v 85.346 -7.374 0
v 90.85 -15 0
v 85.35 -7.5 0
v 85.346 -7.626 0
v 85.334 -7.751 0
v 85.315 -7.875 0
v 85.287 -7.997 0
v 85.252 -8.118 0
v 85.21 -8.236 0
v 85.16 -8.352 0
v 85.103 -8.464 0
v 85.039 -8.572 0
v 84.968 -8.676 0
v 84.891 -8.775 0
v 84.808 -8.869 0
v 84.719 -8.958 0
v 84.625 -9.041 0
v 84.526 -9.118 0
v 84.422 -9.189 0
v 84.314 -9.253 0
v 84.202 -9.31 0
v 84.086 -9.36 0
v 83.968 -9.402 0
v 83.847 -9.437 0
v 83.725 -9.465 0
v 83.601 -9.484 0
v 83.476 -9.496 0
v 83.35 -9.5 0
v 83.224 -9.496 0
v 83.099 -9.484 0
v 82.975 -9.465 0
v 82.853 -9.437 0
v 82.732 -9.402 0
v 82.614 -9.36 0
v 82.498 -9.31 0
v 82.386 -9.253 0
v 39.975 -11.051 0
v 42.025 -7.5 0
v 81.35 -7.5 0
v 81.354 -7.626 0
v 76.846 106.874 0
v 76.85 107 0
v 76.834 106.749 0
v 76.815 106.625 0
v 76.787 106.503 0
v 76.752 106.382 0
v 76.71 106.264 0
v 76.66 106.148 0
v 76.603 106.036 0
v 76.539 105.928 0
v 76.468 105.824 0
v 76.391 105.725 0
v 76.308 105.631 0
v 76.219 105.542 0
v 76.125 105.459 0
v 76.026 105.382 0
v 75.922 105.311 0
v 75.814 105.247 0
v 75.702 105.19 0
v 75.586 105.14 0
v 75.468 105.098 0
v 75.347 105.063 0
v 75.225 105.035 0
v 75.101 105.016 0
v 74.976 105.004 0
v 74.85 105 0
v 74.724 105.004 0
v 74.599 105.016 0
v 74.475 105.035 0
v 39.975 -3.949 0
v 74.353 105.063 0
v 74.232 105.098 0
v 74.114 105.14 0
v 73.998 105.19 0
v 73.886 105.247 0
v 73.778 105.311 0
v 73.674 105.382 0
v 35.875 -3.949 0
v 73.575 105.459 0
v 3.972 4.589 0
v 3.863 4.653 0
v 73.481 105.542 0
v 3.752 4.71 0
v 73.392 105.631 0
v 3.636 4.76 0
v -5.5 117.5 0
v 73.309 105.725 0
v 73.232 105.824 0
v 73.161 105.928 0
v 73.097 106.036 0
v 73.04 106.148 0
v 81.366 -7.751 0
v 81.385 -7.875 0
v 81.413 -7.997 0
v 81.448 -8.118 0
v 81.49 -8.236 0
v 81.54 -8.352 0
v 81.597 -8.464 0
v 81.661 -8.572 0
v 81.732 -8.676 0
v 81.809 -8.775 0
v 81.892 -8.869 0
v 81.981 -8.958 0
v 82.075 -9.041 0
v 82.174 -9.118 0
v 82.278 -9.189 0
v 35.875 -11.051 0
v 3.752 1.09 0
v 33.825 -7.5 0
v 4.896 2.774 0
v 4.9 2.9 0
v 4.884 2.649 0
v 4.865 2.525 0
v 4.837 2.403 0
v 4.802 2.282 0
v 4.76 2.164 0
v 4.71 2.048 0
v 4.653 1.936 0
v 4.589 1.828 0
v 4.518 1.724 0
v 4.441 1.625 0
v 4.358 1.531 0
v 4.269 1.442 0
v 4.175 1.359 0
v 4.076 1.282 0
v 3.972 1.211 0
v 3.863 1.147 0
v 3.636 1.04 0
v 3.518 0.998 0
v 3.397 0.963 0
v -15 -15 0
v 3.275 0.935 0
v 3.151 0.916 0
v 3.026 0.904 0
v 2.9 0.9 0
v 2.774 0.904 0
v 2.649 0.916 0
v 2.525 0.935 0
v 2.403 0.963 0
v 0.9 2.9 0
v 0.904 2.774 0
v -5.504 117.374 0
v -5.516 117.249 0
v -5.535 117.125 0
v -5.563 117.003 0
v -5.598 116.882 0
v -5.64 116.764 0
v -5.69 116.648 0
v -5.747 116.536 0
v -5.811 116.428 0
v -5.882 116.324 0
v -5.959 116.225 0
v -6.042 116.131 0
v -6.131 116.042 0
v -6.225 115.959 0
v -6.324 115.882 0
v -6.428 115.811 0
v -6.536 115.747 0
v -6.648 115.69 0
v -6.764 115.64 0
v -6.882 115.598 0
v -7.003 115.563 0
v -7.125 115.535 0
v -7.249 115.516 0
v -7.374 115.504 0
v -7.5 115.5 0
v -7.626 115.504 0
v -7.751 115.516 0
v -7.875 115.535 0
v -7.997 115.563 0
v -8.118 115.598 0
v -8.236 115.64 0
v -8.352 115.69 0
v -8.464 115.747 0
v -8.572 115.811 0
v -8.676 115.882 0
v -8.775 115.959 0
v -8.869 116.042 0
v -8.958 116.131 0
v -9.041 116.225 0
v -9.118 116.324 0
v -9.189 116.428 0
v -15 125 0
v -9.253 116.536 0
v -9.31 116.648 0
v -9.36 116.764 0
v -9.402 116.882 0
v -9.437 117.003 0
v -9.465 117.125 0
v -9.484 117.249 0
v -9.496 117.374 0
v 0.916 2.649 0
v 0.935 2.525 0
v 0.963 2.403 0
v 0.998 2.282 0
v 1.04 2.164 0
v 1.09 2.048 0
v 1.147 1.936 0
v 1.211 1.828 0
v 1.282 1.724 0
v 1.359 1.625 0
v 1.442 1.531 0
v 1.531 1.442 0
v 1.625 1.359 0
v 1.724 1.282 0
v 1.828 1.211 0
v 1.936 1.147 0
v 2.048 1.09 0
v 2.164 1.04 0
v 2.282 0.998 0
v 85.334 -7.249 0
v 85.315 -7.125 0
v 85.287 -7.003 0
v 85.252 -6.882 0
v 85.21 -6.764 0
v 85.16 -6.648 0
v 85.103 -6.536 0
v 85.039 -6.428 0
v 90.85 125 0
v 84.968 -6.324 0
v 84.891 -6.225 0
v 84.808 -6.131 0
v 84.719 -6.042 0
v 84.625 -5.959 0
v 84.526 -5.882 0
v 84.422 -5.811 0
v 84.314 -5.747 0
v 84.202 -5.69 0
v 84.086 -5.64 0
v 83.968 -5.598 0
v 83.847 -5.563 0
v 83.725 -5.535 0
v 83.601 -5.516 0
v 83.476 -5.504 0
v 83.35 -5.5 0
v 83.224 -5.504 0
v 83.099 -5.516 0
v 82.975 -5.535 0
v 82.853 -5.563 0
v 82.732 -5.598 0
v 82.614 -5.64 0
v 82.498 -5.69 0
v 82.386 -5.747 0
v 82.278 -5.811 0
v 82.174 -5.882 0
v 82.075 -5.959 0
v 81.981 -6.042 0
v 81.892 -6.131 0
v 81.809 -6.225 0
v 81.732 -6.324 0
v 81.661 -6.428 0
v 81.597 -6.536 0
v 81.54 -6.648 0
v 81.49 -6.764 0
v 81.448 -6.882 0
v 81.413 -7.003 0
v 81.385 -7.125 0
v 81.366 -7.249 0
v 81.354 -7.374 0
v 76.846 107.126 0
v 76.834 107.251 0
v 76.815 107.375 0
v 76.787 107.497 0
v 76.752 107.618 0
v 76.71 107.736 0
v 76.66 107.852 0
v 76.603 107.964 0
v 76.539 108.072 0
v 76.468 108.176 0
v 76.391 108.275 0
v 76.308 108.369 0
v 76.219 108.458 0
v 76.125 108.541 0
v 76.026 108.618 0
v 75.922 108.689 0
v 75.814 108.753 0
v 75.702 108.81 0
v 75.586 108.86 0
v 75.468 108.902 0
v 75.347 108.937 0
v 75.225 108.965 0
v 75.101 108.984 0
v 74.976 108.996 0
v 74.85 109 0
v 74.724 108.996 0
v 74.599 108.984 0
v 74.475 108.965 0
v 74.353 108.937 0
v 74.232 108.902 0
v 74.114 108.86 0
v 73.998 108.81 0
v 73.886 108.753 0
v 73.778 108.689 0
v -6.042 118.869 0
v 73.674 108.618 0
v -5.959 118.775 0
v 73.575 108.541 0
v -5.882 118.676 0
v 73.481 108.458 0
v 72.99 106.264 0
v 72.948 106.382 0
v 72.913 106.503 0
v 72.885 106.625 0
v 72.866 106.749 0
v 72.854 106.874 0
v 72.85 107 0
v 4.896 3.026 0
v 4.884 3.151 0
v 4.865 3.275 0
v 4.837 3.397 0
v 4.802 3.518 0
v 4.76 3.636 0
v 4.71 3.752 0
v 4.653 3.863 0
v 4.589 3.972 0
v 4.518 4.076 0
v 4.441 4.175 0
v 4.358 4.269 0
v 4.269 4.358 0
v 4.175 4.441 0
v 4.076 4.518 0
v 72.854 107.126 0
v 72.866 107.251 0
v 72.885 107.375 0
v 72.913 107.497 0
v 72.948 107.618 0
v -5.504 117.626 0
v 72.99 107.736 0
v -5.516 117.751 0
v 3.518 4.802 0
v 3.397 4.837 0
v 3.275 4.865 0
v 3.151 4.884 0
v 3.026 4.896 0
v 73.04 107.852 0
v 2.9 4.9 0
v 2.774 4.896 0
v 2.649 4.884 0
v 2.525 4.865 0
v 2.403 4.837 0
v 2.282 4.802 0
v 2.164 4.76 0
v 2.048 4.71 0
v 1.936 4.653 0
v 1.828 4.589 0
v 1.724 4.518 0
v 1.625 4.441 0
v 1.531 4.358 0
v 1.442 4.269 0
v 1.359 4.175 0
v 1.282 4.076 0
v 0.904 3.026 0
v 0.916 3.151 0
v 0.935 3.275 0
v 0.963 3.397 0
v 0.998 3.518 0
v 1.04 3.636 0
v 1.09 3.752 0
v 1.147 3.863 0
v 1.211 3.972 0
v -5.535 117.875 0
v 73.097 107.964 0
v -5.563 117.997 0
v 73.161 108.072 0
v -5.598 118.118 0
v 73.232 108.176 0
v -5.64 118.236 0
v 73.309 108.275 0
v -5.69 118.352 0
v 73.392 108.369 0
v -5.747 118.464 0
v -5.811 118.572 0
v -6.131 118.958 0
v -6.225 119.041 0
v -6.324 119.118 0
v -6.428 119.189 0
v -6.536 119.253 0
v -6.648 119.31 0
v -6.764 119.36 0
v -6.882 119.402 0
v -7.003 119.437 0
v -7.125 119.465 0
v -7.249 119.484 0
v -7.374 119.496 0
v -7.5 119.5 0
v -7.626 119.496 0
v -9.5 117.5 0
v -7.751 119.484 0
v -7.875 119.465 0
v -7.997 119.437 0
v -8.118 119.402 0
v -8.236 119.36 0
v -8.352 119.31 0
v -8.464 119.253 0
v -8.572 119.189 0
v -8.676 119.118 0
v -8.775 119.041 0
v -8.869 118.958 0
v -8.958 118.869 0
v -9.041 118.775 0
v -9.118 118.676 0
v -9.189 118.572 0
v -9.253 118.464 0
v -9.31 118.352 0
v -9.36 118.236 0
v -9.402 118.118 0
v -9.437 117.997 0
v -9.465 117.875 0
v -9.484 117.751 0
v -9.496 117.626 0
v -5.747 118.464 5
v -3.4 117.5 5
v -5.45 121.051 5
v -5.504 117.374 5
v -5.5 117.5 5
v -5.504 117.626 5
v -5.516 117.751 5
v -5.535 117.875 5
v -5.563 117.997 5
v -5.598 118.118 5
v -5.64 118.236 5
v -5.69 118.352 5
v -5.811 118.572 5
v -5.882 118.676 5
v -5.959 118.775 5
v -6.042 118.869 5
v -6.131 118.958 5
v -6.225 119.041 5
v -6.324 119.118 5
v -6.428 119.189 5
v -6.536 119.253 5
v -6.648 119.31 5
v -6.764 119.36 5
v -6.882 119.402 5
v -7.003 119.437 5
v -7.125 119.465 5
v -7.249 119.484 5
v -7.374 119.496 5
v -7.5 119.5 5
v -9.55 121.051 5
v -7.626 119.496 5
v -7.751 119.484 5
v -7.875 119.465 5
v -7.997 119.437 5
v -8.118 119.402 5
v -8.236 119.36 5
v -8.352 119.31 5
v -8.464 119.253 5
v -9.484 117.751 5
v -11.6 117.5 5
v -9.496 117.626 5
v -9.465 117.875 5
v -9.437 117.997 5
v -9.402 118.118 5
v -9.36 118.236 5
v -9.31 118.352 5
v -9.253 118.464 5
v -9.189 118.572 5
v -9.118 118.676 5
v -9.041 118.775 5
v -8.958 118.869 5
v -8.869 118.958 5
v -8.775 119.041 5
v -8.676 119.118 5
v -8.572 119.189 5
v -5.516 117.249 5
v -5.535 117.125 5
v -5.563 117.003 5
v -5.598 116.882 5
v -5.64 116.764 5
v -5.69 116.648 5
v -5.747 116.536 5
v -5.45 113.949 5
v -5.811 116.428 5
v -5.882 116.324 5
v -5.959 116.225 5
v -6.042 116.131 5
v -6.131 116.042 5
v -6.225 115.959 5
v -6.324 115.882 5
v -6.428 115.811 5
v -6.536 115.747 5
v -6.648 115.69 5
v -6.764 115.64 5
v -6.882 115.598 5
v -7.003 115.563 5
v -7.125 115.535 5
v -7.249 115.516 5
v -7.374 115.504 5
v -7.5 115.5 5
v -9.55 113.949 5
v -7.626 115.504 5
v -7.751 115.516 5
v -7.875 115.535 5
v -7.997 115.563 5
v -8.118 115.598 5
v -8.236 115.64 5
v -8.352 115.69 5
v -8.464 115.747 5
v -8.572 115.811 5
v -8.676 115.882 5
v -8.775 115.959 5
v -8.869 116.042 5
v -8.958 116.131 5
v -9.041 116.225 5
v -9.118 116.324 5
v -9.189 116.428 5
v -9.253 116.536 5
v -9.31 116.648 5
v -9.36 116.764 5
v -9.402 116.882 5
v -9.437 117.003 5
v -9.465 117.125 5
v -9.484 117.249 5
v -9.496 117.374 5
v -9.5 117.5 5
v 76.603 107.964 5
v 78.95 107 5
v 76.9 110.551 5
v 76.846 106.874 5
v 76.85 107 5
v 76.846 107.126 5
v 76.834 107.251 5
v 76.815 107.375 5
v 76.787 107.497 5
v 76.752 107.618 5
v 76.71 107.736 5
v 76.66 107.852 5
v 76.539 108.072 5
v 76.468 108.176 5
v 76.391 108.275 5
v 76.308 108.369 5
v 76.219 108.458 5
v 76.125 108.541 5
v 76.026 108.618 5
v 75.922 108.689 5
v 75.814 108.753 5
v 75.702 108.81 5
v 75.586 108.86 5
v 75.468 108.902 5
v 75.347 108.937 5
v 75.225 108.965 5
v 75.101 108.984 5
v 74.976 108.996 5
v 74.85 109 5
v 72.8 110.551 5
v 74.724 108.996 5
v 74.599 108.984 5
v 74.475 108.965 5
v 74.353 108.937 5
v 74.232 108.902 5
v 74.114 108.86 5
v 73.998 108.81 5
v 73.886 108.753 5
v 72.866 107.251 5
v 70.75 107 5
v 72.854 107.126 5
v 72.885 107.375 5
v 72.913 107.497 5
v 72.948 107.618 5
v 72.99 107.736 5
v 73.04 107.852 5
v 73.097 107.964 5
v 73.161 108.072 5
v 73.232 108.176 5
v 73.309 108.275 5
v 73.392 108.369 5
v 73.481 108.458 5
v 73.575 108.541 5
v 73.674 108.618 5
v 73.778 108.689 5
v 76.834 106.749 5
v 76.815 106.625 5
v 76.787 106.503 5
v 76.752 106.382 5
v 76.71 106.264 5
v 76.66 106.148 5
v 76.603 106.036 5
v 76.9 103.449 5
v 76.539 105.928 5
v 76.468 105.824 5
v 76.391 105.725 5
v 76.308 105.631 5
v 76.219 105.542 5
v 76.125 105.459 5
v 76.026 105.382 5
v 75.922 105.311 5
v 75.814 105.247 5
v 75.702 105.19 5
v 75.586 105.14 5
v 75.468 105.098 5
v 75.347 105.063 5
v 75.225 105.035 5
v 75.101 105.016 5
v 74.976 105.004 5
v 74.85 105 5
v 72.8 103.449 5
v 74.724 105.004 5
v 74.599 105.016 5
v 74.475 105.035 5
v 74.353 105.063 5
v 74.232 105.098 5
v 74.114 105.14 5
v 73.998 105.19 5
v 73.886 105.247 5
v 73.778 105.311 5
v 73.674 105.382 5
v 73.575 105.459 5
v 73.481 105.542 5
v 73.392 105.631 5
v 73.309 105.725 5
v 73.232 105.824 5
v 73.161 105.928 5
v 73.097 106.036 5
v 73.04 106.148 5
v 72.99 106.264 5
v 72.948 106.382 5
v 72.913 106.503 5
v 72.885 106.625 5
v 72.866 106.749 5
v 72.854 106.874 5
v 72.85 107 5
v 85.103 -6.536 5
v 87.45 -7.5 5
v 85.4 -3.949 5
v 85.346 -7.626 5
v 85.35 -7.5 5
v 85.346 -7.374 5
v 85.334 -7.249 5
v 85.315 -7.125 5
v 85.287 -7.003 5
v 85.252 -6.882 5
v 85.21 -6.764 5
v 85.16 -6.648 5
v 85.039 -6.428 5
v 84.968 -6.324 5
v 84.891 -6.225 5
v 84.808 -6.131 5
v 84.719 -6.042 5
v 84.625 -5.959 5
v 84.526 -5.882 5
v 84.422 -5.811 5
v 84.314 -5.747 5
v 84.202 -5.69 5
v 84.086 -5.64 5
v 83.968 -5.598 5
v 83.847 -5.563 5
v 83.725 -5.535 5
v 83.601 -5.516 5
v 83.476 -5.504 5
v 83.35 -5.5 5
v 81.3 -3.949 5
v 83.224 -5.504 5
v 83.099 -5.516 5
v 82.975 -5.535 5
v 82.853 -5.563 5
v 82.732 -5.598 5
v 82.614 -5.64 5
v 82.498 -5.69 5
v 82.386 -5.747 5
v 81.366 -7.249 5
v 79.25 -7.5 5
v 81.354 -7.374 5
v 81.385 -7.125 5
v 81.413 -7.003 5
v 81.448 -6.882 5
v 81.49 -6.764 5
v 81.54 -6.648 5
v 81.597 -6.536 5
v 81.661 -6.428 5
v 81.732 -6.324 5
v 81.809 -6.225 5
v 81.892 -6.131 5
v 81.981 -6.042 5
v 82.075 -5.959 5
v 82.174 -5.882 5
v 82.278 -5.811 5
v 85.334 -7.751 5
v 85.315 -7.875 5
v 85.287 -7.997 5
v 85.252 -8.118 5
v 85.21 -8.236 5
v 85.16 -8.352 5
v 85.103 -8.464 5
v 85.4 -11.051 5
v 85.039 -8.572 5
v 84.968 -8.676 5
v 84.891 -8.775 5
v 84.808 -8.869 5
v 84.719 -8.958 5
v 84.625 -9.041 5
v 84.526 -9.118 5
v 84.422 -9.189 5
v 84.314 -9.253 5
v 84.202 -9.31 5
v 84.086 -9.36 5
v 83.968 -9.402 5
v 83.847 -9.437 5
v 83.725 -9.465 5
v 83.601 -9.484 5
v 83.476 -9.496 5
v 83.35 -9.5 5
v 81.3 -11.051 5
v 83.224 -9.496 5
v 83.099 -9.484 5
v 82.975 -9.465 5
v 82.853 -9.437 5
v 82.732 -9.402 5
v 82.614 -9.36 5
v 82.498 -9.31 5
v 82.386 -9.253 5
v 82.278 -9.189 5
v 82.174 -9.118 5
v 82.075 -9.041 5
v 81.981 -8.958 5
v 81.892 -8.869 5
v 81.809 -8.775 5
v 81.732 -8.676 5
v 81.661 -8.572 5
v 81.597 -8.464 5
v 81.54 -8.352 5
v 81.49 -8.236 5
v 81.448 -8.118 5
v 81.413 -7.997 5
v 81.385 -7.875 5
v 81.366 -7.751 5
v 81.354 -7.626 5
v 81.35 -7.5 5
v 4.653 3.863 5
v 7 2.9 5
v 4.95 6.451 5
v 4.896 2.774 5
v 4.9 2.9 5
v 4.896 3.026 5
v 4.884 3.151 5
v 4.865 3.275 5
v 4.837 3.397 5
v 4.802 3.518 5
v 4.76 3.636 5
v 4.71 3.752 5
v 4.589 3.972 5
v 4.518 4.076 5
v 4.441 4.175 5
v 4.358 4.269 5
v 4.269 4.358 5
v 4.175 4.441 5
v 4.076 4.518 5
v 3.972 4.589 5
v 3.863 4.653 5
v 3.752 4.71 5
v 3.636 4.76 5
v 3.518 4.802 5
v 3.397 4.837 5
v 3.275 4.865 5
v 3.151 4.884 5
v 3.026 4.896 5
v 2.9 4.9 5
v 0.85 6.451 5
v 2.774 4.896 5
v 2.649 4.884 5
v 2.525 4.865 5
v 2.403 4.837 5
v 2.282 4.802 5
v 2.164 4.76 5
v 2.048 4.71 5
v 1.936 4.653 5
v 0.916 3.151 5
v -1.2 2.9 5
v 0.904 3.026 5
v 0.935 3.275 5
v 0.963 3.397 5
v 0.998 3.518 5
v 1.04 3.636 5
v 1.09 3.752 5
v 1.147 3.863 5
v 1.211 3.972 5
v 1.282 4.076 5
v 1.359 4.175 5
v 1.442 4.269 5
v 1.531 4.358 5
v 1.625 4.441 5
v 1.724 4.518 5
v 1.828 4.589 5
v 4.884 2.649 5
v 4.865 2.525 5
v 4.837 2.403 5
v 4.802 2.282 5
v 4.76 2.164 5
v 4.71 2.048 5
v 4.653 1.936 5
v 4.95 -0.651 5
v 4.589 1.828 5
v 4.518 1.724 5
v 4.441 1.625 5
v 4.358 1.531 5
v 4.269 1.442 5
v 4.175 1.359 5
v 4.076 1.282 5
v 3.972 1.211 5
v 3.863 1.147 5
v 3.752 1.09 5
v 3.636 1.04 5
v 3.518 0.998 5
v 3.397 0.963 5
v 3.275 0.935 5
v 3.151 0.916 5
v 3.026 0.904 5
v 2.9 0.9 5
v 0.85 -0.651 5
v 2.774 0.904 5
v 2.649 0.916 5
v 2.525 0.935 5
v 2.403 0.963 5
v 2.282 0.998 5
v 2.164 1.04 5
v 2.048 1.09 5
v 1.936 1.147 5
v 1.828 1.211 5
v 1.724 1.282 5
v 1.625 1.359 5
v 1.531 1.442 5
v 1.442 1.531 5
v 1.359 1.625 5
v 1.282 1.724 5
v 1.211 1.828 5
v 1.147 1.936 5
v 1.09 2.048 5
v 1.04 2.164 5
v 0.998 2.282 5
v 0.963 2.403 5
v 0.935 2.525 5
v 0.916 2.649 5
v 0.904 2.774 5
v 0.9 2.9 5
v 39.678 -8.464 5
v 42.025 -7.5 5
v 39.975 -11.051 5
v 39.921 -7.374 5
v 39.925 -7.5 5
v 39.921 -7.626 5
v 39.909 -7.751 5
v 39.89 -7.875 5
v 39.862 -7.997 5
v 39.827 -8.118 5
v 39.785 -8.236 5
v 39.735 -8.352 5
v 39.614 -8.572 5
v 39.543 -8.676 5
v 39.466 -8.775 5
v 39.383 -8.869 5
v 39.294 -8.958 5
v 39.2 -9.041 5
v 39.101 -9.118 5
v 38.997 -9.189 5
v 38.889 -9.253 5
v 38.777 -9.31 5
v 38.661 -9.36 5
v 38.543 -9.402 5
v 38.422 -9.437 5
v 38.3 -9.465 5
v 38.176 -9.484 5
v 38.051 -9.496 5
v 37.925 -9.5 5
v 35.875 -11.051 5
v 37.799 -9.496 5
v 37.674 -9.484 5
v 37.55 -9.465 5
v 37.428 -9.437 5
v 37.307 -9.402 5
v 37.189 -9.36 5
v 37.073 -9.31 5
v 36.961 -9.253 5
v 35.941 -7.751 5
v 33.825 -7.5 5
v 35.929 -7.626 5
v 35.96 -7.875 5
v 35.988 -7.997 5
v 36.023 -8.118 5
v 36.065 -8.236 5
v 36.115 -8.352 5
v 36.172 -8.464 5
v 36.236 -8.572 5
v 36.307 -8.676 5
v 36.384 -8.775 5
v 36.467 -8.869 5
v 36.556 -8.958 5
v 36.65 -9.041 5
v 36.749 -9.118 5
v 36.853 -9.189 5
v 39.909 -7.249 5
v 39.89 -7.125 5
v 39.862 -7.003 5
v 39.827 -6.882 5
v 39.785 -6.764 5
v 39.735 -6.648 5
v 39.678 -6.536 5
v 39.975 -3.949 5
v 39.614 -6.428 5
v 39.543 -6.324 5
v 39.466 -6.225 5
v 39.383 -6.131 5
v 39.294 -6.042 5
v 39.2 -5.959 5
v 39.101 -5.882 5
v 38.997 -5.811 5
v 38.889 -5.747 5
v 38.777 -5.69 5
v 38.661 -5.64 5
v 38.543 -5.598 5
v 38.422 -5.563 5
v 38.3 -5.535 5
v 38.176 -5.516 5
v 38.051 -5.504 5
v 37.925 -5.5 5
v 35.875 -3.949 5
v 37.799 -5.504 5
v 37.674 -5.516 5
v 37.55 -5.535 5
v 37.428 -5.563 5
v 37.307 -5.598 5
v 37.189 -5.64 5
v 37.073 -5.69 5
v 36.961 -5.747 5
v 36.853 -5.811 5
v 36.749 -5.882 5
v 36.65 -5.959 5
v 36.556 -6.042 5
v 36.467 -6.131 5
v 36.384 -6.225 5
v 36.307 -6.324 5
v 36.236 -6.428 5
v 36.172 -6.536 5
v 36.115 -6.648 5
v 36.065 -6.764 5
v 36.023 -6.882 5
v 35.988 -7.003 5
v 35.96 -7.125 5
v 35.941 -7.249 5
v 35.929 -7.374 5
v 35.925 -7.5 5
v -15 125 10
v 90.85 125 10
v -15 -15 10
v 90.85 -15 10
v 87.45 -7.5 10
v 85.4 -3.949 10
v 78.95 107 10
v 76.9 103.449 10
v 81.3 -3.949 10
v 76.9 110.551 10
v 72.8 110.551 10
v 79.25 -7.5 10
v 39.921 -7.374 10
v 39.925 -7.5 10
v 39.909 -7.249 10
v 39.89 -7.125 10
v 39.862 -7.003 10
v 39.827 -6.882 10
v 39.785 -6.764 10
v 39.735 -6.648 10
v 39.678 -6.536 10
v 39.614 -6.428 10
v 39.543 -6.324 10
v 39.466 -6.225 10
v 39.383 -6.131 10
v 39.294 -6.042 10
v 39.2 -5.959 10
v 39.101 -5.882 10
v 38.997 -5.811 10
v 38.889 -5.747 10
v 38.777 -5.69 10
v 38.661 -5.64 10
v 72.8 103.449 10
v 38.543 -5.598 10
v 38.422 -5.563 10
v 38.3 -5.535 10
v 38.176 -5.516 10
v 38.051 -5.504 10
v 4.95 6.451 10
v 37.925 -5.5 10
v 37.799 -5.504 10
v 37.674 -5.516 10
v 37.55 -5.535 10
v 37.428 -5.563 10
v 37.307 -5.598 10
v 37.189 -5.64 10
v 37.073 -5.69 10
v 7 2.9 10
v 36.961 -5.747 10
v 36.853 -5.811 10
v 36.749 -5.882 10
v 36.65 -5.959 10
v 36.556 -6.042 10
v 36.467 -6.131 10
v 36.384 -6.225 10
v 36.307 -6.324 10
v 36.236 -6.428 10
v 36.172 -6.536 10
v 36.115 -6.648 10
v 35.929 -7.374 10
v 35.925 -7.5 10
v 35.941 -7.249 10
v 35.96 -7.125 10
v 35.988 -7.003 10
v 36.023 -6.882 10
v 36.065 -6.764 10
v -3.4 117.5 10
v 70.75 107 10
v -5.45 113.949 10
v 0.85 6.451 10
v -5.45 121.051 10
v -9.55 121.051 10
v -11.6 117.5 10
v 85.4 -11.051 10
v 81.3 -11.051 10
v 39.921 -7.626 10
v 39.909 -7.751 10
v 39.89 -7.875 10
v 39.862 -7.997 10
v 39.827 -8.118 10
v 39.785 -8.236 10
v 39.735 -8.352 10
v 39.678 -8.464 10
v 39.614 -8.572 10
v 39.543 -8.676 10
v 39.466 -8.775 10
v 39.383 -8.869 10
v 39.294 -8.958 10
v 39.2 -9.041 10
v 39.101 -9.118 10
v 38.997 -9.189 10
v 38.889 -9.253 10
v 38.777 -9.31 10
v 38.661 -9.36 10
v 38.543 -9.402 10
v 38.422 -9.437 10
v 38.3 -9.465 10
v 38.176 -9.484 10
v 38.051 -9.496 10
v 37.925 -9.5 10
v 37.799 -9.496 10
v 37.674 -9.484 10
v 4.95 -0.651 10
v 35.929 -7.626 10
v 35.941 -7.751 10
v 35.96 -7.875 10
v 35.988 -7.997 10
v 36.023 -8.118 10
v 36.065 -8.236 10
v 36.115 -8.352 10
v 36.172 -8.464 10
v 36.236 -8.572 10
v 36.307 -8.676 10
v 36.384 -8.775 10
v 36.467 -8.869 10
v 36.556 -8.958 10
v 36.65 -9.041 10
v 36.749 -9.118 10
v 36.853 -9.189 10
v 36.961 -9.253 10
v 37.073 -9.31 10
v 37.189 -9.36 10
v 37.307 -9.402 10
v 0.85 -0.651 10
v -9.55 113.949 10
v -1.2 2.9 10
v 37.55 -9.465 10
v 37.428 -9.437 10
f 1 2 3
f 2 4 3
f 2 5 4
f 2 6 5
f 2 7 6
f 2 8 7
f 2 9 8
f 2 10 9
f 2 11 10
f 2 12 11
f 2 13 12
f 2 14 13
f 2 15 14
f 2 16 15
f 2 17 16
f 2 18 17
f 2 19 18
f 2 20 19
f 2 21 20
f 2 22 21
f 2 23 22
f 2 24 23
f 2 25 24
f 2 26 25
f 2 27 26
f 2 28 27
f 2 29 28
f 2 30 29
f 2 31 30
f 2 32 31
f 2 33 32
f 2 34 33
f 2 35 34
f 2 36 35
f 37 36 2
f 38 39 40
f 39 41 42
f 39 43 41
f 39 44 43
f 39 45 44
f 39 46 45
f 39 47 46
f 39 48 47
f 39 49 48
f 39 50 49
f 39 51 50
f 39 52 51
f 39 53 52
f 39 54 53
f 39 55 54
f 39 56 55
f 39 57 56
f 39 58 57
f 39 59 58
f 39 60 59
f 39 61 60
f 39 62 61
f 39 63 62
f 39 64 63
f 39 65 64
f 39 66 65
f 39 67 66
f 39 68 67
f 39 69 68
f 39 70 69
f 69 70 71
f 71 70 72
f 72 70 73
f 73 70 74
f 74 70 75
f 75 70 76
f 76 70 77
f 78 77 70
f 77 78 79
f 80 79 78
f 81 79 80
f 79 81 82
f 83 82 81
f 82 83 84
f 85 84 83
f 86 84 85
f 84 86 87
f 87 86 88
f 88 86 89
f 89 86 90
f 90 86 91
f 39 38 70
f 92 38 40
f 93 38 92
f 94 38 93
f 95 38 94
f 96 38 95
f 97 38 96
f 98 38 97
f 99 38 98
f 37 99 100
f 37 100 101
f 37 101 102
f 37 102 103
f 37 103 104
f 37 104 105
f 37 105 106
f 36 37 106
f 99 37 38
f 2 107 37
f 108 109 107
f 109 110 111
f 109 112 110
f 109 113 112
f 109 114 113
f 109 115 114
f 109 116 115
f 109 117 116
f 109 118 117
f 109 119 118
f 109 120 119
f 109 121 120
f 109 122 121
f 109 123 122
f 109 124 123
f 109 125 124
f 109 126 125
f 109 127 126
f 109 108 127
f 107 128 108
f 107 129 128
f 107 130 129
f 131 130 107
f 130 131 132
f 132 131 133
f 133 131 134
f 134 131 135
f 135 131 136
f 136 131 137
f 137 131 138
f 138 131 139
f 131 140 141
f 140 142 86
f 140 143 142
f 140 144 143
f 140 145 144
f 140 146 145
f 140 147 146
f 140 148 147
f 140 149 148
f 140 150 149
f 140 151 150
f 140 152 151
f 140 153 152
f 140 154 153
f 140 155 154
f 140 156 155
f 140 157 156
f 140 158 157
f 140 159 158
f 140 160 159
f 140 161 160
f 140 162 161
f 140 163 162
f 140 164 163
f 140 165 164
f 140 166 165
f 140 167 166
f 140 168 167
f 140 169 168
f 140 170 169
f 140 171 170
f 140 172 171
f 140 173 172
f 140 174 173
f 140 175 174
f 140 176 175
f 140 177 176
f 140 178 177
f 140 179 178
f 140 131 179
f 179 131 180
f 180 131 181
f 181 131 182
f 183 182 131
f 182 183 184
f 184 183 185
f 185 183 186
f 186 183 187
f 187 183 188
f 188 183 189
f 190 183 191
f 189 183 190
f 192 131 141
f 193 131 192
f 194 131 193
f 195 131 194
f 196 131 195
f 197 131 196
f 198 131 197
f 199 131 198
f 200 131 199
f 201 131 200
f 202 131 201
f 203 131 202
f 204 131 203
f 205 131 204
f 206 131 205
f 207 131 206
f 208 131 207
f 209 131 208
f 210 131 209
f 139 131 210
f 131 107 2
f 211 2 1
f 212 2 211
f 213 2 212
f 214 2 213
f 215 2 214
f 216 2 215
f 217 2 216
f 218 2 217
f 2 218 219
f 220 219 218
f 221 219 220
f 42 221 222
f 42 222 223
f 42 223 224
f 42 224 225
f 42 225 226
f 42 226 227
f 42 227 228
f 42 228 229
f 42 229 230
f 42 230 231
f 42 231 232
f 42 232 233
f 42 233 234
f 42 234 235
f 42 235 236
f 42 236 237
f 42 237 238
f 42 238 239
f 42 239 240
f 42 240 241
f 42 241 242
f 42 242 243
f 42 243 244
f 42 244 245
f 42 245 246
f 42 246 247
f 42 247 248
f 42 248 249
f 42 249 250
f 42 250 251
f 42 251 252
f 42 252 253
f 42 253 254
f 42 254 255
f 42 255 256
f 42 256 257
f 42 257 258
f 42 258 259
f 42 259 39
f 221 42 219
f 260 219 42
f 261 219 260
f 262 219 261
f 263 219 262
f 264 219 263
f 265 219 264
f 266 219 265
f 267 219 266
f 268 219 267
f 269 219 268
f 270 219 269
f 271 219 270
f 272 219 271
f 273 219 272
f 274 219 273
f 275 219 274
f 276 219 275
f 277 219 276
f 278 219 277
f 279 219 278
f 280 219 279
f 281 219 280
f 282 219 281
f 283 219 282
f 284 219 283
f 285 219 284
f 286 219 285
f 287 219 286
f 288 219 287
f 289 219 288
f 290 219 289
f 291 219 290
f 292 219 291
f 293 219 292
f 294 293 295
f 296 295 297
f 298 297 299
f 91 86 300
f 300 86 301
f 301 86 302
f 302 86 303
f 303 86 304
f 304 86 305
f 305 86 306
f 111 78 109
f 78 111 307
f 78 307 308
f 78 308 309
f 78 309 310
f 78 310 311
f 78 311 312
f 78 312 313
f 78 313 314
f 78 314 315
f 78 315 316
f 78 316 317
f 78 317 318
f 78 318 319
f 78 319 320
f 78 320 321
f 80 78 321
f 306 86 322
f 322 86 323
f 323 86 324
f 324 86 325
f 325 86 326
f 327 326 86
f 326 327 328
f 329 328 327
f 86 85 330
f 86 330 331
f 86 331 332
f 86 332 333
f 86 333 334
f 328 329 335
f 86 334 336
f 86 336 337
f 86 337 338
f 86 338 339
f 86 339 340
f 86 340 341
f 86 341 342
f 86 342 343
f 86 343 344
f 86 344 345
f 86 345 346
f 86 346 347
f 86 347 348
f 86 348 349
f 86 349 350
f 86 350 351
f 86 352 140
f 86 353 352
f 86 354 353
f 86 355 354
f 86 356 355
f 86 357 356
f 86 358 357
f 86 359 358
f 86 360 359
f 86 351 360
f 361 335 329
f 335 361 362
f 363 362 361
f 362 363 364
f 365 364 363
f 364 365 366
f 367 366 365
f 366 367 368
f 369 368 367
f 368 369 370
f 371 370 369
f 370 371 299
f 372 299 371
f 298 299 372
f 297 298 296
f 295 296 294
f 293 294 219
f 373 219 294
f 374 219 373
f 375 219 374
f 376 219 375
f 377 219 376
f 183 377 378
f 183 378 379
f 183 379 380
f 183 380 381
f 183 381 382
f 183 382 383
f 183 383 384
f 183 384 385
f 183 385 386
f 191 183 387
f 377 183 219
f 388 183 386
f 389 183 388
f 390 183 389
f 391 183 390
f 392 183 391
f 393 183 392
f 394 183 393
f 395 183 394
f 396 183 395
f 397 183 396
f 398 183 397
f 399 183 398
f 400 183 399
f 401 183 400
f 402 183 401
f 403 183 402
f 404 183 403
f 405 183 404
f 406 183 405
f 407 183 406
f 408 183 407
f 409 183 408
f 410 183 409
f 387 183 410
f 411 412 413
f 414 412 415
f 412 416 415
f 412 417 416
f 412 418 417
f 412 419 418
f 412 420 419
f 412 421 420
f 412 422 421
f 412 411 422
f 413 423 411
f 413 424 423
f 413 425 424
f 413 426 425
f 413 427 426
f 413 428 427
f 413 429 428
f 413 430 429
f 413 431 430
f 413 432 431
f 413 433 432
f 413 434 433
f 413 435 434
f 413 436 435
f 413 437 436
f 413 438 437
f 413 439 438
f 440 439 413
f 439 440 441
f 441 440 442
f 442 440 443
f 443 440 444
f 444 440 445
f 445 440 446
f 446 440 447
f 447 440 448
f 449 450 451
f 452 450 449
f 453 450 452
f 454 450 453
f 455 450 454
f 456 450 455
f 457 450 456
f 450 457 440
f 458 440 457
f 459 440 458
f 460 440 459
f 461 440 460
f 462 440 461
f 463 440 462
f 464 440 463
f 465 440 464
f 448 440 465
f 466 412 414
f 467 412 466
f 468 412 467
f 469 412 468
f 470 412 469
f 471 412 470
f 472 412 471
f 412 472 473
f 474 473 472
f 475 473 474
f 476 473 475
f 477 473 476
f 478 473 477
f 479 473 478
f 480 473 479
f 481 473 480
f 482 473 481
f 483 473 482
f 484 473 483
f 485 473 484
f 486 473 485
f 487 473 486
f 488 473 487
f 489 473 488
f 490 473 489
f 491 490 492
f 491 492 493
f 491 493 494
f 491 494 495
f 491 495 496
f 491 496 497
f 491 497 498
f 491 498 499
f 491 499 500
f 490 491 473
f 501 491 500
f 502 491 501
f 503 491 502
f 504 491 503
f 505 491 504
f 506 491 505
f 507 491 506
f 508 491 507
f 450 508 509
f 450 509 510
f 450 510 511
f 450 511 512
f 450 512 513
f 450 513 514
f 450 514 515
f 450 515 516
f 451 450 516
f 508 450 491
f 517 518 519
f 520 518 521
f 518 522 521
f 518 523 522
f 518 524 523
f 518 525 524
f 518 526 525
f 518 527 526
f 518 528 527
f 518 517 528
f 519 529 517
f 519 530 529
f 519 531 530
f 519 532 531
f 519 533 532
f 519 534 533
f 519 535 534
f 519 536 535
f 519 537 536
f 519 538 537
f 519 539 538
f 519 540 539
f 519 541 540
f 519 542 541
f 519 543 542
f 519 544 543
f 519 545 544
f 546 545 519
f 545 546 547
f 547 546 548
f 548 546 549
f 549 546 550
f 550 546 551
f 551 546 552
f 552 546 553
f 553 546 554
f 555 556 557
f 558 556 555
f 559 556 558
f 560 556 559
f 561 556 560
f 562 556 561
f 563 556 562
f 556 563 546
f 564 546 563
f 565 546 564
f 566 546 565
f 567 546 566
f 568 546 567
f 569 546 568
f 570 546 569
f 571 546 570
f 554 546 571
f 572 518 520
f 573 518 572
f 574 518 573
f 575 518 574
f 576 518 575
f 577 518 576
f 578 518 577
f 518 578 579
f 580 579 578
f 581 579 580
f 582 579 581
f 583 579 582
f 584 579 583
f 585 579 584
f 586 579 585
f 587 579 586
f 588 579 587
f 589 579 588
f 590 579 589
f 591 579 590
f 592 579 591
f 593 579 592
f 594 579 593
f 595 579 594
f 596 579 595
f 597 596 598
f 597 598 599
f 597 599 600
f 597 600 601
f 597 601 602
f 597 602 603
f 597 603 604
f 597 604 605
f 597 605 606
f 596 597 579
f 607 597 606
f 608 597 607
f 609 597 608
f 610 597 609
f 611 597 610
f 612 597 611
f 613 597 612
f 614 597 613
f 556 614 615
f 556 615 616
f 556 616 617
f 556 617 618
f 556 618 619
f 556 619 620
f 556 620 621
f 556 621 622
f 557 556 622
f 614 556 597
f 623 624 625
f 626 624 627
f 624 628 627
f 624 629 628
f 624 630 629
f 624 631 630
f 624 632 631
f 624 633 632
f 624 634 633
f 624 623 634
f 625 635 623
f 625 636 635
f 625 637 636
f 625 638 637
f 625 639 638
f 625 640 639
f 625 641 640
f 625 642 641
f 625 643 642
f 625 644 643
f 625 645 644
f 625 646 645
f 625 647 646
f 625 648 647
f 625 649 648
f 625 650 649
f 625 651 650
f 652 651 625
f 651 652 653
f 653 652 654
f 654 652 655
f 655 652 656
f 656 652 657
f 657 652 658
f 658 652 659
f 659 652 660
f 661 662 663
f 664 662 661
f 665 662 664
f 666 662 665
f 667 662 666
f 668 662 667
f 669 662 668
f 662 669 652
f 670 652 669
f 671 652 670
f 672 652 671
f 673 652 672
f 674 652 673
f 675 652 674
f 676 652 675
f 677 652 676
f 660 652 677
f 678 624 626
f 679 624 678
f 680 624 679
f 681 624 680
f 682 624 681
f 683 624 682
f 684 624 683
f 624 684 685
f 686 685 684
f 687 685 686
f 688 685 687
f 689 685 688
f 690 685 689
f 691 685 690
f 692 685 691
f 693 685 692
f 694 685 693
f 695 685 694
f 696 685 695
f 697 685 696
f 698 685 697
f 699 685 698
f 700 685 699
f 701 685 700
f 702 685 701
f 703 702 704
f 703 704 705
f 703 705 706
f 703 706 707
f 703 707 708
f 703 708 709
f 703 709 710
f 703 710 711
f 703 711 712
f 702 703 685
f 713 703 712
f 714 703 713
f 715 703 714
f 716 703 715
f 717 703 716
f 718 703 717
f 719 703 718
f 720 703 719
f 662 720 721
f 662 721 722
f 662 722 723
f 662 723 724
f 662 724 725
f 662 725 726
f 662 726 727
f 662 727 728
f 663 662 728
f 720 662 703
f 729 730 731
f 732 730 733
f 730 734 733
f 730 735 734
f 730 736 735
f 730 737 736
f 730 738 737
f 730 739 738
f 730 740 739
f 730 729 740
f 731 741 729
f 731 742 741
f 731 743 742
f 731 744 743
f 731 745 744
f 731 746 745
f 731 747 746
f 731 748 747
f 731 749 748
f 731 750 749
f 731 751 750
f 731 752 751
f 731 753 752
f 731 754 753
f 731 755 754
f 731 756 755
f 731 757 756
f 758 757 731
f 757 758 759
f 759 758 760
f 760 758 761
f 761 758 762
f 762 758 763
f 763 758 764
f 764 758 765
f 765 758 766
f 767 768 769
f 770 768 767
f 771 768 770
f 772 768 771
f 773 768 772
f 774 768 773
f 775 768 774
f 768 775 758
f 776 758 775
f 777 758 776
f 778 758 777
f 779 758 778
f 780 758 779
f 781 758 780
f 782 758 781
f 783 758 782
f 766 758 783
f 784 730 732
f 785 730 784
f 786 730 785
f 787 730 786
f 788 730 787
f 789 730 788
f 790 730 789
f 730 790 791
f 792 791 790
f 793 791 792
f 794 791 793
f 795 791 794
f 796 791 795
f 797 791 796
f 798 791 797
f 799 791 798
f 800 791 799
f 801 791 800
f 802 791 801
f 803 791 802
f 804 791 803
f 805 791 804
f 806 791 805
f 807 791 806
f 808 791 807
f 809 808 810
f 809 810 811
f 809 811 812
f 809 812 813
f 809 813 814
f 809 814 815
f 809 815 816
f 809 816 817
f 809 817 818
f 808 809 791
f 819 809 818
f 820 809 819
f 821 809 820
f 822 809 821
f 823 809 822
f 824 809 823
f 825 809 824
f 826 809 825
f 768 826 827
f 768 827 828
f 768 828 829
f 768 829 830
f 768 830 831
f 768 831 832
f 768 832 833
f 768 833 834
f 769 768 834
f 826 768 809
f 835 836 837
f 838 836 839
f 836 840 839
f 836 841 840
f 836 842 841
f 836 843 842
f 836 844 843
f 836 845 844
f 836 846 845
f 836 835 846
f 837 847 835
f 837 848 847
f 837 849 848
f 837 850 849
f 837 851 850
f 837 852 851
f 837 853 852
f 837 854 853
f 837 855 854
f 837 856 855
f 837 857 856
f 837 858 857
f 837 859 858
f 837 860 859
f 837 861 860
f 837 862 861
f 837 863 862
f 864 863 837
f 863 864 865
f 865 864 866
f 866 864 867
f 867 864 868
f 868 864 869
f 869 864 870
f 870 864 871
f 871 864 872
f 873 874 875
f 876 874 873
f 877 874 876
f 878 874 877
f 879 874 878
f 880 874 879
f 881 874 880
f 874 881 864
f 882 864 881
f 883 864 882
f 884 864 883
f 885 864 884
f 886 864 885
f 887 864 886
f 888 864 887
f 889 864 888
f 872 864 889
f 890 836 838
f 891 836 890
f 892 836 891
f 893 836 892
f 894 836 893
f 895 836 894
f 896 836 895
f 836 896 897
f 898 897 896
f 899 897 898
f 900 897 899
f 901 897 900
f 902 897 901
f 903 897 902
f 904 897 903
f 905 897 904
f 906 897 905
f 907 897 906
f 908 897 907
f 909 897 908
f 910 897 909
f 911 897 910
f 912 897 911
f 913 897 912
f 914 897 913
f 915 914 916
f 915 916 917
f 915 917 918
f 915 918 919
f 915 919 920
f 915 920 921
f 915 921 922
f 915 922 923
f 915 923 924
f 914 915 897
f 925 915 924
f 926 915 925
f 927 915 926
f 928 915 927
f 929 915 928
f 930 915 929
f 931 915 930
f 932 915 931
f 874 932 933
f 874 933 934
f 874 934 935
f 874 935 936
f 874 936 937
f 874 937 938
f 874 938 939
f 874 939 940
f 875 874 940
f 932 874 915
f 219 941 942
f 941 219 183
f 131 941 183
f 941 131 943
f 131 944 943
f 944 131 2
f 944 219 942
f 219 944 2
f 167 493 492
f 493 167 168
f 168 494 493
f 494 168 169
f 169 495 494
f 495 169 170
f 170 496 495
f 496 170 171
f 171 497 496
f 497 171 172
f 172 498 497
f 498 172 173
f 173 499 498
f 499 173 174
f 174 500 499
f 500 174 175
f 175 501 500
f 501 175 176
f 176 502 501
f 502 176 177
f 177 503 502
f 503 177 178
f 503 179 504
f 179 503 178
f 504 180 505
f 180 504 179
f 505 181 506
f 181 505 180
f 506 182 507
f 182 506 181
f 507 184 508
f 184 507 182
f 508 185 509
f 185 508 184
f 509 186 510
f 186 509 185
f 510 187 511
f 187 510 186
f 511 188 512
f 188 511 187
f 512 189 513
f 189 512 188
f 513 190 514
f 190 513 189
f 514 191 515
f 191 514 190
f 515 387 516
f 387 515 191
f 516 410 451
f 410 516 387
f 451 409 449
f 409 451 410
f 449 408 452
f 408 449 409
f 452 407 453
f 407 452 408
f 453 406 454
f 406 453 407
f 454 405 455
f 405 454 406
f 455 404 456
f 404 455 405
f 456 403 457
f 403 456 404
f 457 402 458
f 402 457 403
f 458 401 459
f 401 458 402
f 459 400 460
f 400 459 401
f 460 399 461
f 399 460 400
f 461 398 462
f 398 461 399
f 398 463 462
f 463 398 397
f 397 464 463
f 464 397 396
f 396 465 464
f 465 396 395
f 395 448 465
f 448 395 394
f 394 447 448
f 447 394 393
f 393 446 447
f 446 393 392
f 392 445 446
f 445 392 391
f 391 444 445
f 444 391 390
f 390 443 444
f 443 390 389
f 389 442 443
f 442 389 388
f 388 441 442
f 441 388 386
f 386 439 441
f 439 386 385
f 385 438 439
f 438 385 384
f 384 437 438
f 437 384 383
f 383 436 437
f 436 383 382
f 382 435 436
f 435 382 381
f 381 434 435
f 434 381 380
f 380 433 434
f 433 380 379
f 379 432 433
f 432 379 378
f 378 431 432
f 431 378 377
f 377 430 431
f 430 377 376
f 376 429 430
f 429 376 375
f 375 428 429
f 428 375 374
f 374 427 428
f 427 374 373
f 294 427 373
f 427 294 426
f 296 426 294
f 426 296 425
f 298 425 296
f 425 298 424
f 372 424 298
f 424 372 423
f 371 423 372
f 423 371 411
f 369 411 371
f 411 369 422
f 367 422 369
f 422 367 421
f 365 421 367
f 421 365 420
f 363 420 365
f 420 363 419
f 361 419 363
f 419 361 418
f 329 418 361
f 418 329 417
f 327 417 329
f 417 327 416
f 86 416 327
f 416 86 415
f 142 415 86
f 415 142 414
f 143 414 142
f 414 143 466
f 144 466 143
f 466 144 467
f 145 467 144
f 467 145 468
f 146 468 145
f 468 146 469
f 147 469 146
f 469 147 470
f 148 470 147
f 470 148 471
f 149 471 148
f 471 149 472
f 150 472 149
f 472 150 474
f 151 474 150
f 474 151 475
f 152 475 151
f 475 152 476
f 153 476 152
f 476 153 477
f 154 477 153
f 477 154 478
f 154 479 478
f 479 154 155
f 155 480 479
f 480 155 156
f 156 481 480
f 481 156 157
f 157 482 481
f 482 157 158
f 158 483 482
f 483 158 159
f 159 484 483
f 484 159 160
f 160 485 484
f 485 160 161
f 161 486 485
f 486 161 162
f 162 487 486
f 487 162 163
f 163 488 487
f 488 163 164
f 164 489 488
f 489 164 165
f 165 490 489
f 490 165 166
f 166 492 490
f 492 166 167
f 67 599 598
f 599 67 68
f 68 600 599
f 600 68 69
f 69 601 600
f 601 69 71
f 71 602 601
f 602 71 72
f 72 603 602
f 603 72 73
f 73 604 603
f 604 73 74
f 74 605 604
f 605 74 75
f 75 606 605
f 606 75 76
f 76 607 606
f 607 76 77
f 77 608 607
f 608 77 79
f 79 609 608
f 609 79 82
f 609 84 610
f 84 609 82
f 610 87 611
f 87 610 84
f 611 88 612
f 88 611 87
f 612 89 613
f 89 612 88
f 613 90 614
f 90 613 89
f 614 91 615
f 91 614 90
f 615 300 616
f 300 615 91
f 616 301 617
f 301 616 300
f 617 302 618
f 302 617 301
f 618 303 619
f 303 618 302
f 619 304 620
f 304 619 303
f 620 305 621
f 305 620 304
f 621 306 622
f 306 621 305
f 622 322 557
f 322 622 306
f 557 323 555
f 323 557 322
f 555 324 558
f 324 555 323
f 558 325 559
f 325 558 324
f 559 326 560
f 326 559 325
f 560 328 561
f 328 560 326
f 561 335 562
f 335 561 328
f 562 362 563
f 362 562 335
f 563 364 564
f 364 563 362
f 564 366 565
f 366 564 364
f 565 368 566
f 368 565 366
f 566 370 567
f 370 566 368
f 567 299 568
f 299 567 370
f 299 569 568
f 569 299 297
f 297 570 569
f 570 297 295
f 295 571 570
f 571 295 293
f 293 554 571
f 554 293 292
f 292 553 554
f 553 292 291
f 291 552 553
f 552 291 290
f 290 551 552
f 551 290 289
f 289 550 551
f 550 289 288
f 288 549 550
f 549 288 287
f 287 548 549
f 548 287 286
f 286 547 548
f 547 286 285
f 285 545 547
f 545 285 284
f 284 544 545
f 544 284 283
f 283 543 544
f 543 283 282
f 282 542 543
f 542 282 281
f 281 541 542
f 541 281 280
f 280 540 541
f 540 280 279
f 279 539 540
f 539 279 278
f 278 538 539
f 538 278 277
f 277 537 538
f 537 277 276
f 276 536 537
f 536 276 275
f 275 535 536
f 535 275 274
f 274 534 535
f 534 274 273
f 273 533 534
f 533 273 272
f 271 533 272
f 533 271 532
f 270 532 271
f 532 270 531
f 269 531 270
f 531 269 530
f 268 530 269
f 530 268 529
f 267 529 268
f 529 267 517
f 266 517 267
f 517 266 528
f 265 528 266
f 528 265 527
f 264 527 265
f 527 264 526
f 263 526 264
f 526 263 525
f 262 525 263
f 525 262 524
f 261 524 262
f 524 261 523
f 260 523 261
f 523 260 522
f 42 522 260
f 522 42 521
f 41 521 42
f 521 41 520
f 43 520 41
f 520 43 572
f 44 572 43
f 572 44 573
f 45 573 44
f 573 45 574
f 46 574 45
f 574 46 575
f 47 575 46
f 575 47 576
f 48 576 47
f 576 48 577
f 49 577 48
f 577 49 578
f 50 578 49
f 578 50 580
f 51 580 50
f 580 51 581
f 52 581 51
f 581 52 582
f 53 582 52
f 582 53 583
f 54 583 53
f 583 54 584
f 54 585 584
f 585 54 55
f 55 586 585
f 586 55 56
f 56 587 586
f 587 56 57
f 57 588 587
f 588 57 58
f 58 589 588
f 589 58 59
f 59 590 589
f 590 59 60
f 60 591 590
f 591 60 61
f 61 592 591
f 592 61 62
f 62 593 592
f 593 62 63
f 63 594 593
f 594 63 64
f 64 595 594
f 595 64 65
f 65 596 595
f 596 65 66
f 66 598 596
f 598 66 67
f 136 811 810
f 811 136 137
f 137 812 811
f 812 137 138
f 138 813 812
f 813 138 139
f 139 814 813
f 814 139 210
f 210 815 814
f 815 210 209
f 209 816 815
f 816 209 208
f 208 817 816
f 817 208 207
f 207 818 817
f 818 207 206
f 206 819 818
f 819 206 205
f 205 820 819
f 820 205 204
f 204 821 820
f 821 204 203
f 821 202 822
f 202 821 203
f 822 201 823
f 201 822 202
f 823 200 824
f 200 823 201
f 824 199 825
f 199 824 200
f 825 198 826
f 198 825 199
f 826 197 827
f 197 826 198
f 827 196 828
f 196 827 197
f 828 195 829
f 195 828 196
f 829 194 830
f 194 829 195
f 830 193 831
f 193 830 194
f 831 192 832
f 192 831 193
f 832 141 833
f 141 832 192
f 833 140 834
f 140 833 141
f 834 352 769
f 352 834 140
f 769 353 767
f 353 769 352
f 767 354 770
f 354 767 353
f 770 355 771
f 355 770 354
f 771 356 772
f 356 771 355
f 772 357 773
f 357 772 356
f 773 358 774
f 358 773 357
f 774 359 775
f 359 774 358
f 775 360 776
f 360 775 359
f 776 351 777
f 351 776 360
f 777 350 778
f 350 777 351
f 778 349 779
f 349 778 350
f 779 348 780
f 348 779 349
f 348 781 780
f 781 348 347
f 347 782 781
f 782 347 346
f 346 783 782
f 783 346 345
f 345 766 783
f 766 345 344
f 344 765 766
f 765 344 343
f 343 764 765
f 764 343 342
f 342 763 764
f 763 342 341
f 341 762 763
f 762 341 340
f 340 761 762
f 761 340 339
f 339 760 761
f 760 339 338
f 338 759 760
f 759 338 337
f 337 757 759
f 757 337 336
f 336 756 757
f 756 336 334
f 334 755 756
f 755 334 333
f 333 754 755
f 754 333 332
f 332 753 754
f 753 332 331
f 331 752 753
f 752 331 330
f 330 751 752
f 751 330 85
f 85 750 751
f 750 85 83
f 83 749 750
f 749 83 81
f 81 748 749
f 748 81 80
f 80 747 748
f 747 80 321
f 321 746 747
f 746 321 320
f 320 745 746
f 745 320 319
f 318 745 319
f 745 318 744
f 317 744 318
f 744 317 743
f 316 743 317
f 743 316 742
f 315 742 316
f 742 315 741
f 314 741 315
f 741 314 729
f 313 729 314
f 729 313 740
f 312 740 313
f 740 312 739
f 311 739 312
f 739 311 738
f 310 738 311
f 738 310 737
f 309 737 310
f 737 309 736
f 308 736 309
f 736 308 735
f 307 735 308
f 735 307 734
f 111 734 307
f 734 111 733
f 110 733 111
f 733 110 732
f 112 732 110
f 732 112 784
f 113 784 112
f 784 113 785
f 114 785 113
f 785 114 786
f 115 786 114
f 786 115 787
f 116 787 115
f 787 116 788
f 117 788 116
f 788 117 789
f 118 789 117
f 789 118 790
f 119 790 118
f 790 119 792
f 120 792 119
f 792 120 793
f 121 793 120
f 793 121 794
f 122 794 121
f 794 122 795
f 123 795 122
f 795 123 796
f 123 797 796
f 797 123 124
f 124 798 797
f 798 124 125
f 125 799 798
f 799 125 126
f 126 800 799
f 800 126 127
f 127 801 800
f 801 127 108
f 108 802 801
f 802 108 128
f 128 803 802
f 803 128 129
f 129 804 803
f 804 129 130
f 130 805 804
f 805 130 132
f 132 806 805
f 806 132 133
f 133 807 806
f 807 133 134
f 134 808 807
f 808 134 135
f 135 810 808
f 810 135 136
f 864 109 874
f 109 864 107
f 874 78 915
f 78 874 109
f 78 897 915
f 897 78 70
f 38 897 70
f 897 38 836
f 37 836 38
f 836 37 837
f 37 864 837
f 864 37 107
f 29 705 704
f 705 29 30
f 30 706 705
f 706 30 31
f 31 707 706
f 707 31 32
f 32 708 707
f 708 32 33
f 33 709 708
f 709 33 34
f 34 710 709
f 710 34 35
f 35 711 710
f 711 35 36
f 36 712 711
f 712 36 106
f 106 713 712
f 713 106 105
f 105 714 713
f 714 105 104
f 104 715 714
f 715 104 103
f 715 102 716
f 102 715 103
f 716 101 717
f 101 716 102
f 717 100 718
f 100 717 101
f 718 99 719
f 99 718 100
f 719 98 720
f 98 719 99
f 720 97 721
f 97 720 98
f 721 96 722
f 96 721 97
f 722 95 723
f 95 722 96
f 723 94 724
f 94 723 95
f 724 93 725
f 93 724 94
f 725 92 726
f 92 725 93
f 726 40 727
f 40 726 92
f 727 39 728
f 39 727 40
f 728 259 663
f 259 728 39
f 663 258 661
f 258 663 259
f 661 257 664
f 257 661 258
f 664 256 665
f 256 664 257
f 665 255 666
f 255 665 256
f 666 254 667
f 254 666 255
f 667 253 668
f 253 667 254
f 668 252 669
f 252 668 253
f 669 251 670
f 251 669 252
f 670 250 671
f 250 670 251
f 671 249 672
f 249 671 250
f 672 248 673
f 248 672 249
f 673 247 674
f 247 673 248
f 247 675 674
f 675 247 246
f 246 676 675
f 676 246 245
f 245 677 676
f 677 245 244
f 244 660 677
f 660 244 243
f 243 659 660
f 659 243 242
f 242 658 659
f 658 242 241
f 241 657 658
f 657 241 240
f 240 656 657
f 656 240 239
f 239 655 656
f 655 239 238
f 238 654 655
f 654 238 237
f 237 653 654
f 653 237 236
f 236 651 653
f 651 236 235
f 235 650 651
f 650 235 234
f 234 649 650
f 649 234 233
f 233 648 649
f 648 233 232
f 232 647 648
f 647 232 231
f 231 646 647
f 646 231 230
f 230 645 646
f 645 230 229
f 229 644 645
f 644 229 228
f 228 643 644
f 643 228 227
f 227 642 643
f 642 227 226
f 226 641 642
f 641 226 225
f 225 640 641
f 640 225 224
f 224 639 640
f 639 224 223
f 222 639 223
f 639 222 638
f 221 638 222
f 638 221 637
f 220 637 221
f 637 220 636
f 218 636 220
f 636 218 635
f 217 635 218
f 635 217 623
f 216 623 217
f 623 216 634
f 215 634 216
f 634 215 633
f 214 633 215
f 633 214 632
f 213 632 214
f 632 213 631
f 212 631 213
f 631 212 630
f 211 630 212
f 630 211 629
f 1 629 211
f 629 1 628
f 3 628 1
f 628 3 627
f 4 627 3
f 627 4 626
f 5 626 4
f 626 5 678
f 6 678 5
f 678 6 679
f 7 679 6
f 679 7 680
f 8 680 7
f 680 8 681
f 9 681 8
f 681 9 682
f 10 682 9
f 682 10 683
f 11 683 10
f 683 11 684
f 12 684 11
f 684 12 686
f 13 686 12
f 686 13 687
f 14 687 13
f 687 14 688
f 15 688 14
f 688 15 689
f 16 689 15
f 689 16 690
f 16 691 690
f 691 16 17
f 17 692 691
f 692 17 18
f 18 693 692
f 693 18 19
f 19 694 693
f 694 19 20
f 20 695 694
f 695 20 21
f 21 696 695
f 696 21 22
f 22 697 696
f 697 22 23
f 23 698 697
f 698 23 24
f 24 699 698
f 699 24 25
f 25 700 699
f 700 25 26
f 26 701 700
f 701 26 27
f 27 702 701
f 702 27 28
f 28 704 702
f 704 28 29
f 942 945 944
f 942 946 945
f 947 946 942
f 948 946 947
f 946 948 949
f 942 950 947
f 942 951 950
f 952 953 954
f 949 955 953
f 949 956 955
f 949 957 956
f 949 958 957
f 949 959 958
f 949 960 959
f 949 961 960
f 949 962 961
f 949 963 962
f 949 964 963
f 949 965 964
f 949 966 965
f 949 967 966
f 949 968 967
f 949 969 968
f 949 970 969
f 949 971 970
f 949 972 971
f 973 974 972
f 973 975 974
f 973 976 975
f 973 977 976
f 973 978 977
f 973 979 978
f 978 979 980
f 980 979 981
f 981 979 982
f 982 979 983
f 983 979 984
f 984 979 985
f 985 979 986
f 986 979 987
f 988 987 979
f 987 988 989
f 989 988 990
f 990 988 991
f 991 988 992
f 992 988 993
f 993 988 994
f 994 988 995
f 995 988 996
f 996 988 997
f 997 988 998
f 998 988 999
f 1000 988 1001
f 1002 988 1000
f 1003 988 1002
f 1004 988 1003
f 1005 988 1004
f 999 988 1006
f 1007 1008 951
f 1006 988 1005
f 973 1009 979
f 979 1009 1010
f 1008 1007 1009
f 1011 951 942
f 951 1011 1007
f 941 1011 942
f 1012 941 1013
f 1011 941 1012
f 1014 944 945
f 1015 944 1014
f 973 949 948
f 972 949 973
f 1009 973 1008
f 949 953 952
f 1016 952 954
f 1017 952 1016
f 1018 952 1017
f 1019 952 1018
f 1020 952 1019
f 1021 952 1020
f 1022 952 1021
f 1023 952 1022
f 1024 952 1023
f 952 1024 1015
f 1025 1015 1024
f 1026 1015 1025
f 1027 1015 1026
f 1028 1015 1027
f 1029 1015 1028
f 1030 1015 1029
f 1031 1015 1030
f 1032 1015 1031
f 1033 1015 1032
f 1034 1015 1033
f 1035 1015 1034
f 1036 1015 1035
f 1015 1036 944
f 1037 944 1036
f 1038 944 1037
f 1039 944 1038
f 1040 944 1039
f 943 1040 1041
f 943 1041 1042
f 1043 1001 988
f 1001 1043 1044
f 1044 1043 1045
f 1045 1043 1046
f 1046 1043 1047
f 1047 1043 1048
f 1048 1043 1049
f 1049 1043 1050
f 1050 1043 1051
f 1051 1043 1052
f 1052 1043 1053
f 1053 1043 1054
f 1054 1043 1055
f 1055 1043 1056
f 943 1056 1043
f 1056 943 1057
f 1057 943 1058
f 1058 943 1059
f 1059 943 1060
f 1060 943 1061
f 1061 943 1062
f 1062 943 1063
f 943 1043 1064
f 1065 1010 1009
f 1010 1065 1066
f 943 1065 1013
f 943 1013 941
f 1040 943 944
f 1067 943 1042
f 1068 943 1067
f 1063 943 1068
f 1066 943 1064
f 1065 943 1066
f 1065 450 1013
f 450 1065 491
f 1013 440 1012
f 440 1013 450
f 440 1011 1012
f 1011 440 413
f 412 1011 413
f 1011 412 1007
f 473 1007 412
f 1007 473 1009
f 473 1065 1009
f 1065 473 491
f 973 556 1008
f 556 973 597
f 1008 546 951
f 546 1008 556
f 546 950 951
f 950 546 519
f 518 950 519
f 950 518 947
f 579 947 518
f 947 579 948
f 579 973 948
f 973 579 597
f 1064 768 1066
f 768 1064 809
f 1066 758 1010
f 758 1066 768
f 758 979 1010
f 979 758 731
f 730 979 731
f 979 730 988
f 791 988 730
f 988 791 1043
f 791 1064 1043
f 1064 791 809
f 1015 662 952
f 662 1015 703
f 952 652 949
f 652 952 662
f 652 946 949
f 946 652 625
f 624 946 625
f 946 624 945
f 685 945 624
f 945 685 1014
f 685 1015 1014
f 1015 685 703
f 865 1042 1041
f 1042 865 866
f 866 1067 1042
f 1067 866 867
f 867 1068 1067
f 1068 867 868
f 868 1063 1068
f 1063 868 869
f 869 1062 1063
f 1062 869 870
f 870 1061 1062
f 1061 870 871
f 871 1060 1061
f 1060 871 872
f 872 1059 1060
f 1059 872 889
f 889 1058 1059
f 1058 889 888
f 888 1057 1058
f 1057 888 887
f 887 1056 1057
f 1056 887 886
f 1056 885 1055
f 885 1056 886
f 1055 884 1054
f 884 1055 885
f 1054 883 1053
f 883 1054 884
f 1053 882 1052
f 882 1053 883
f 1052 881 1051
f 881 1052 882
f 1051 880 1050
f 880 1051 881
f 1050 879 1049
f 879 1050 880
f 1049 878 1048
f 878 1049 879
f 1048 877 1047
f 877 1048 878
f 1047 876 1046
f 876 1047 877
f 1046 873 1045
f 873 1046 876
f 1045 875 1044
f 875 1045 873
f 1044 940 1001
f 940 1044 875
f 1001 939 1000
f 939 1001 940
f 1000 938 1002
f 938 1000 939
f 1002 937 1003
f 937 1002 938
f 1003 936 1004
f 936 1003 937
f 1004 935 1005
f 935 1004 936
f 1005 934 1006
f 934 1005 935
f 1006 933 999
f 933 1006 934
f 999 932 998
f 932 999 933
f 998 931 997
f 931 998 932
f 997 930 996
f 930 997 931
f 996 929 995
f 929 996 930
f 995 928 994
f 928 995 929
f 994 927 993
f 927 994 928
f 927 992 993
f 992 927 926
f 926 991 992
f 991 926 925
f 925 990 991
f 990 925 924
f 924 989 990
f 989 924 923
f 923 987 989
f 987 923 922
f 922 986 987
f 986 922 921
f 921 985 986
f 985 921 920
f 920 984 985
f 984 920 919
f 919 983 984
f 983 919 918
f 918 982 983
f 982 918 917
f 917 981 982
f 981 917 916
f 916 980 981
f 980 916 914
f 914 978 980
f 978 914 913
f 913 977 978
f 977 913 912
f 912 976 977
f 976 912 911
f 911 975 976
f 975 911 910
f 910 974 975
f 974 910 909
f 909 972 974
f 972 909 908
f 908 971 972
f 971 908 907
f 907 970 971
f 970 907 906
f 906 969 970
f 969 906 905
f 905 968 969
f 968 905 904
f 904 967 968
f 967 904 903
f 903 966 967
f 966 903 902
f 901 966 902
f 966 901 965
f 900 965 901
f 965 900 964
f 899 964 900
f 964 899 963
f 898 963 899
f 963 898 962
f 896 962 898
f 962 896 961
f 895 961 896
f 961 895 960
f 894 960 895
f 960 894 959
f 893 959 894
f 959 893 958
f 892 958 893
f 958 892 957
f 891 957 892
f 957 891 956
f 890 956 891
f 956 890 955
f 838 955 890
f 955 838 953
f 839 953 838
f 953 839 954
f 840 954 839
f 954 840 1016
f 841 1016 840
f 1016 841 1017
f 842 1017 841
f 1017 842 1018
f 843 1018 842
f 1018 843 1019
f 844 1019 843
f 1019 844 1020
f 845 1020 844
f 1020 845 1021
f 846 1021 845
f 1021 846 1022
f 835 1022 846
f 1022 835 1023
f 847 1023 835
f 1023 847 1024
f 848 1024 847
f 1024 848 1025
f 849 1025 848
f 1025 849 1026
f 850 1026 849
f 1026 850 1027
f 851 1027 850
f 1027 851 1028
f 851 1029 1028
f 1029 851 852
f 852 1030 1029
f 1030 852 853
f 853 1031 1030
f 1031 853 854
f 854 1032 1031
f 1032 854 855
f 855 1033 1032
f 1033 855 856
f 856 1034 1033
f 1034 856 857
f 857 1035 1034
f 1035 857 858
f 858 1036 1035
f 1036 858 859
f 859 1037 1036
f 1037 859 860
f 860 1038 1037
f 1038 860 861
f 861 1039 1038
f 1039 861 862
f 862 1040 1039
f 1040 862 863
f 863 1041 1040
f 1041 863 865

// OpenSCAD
PSU_WIDTH = 75.85;
PSU_DEPTH = 110;
PSU_HEIGHT = 37;
LAYER_HEIGHT = 5;
OFFSET = 15;

module main(){
  base_connector();
}

module base_connector(){
  // First layer
  linear_extrude(LAYER_HEIGHT)  
  difference(){
    translate([-OFFSET, -OFFSET])
    square([PSU_WIDTH + OFFSET*2, PSU_DEPTH + OFFSET*2]);

    translate([2.9, 2.9, 0])
    m4_6_screw_2d();

    translate([PSU_WIDTH-1, PSU_DEPTH-3, 0])
    m4_6_screw_2d();

    translate([-OFFSET/2, PSU_DEPTH + OFFSET/2, 0])    
    m4_6_screw_2d();        

    translate([PSU_WIDTH + OFFSET/2, -OFFSET/2, 0])
    m4_6_screw_2d();

    translate([PSU_WIDTH/2, -OFFSET/2, 0])
    m4_6_nut_2d();              
    
  }

  // Second layer
  translate([0,0,LAYER_HEIGHT])
  linear_extrude(LAYER_HEIGHT)  
  difference(){
    translate([-OFFSET, -OFFSET])
    square([PSU_WIDTH + OFFSET*2, PSU_DEPTH + OFFSET*2]);

    translate([2.9, 2.9, 0])
    m4_6_nut_2d();

    translate([PSU_WIDTH-1, PSU_DEPTH-3, 0])
    m4_6_nut_2d();

    translate([-OFFSET/2, PSU_DEPTH + OFFSET/2, 0])    
    m4_6_nut_2d();

    translate([PSU_WIDTH + OFFSET/2, -OFFSET/2, 0])    
    m4_6_nut_2d();

    translate([PSU_WIDTH/2, -OFFSET/2, 0])
    m4_6_screw_2d();    
  }
  
}

module m4_6_screw_2d(){
  $fn = 100;
  circle(2);
}


module m4_6_screw_3d(length){
  linear_extrude(length)
    m4_6_screw_2d();
}

module m4_6_nut_2d(){
  $fn = 6;
  circle(4.1);
}
module m4_6_nut_3d(length){
  linear_extrude(length)
  m4_6_nut_2d();
}


main();
